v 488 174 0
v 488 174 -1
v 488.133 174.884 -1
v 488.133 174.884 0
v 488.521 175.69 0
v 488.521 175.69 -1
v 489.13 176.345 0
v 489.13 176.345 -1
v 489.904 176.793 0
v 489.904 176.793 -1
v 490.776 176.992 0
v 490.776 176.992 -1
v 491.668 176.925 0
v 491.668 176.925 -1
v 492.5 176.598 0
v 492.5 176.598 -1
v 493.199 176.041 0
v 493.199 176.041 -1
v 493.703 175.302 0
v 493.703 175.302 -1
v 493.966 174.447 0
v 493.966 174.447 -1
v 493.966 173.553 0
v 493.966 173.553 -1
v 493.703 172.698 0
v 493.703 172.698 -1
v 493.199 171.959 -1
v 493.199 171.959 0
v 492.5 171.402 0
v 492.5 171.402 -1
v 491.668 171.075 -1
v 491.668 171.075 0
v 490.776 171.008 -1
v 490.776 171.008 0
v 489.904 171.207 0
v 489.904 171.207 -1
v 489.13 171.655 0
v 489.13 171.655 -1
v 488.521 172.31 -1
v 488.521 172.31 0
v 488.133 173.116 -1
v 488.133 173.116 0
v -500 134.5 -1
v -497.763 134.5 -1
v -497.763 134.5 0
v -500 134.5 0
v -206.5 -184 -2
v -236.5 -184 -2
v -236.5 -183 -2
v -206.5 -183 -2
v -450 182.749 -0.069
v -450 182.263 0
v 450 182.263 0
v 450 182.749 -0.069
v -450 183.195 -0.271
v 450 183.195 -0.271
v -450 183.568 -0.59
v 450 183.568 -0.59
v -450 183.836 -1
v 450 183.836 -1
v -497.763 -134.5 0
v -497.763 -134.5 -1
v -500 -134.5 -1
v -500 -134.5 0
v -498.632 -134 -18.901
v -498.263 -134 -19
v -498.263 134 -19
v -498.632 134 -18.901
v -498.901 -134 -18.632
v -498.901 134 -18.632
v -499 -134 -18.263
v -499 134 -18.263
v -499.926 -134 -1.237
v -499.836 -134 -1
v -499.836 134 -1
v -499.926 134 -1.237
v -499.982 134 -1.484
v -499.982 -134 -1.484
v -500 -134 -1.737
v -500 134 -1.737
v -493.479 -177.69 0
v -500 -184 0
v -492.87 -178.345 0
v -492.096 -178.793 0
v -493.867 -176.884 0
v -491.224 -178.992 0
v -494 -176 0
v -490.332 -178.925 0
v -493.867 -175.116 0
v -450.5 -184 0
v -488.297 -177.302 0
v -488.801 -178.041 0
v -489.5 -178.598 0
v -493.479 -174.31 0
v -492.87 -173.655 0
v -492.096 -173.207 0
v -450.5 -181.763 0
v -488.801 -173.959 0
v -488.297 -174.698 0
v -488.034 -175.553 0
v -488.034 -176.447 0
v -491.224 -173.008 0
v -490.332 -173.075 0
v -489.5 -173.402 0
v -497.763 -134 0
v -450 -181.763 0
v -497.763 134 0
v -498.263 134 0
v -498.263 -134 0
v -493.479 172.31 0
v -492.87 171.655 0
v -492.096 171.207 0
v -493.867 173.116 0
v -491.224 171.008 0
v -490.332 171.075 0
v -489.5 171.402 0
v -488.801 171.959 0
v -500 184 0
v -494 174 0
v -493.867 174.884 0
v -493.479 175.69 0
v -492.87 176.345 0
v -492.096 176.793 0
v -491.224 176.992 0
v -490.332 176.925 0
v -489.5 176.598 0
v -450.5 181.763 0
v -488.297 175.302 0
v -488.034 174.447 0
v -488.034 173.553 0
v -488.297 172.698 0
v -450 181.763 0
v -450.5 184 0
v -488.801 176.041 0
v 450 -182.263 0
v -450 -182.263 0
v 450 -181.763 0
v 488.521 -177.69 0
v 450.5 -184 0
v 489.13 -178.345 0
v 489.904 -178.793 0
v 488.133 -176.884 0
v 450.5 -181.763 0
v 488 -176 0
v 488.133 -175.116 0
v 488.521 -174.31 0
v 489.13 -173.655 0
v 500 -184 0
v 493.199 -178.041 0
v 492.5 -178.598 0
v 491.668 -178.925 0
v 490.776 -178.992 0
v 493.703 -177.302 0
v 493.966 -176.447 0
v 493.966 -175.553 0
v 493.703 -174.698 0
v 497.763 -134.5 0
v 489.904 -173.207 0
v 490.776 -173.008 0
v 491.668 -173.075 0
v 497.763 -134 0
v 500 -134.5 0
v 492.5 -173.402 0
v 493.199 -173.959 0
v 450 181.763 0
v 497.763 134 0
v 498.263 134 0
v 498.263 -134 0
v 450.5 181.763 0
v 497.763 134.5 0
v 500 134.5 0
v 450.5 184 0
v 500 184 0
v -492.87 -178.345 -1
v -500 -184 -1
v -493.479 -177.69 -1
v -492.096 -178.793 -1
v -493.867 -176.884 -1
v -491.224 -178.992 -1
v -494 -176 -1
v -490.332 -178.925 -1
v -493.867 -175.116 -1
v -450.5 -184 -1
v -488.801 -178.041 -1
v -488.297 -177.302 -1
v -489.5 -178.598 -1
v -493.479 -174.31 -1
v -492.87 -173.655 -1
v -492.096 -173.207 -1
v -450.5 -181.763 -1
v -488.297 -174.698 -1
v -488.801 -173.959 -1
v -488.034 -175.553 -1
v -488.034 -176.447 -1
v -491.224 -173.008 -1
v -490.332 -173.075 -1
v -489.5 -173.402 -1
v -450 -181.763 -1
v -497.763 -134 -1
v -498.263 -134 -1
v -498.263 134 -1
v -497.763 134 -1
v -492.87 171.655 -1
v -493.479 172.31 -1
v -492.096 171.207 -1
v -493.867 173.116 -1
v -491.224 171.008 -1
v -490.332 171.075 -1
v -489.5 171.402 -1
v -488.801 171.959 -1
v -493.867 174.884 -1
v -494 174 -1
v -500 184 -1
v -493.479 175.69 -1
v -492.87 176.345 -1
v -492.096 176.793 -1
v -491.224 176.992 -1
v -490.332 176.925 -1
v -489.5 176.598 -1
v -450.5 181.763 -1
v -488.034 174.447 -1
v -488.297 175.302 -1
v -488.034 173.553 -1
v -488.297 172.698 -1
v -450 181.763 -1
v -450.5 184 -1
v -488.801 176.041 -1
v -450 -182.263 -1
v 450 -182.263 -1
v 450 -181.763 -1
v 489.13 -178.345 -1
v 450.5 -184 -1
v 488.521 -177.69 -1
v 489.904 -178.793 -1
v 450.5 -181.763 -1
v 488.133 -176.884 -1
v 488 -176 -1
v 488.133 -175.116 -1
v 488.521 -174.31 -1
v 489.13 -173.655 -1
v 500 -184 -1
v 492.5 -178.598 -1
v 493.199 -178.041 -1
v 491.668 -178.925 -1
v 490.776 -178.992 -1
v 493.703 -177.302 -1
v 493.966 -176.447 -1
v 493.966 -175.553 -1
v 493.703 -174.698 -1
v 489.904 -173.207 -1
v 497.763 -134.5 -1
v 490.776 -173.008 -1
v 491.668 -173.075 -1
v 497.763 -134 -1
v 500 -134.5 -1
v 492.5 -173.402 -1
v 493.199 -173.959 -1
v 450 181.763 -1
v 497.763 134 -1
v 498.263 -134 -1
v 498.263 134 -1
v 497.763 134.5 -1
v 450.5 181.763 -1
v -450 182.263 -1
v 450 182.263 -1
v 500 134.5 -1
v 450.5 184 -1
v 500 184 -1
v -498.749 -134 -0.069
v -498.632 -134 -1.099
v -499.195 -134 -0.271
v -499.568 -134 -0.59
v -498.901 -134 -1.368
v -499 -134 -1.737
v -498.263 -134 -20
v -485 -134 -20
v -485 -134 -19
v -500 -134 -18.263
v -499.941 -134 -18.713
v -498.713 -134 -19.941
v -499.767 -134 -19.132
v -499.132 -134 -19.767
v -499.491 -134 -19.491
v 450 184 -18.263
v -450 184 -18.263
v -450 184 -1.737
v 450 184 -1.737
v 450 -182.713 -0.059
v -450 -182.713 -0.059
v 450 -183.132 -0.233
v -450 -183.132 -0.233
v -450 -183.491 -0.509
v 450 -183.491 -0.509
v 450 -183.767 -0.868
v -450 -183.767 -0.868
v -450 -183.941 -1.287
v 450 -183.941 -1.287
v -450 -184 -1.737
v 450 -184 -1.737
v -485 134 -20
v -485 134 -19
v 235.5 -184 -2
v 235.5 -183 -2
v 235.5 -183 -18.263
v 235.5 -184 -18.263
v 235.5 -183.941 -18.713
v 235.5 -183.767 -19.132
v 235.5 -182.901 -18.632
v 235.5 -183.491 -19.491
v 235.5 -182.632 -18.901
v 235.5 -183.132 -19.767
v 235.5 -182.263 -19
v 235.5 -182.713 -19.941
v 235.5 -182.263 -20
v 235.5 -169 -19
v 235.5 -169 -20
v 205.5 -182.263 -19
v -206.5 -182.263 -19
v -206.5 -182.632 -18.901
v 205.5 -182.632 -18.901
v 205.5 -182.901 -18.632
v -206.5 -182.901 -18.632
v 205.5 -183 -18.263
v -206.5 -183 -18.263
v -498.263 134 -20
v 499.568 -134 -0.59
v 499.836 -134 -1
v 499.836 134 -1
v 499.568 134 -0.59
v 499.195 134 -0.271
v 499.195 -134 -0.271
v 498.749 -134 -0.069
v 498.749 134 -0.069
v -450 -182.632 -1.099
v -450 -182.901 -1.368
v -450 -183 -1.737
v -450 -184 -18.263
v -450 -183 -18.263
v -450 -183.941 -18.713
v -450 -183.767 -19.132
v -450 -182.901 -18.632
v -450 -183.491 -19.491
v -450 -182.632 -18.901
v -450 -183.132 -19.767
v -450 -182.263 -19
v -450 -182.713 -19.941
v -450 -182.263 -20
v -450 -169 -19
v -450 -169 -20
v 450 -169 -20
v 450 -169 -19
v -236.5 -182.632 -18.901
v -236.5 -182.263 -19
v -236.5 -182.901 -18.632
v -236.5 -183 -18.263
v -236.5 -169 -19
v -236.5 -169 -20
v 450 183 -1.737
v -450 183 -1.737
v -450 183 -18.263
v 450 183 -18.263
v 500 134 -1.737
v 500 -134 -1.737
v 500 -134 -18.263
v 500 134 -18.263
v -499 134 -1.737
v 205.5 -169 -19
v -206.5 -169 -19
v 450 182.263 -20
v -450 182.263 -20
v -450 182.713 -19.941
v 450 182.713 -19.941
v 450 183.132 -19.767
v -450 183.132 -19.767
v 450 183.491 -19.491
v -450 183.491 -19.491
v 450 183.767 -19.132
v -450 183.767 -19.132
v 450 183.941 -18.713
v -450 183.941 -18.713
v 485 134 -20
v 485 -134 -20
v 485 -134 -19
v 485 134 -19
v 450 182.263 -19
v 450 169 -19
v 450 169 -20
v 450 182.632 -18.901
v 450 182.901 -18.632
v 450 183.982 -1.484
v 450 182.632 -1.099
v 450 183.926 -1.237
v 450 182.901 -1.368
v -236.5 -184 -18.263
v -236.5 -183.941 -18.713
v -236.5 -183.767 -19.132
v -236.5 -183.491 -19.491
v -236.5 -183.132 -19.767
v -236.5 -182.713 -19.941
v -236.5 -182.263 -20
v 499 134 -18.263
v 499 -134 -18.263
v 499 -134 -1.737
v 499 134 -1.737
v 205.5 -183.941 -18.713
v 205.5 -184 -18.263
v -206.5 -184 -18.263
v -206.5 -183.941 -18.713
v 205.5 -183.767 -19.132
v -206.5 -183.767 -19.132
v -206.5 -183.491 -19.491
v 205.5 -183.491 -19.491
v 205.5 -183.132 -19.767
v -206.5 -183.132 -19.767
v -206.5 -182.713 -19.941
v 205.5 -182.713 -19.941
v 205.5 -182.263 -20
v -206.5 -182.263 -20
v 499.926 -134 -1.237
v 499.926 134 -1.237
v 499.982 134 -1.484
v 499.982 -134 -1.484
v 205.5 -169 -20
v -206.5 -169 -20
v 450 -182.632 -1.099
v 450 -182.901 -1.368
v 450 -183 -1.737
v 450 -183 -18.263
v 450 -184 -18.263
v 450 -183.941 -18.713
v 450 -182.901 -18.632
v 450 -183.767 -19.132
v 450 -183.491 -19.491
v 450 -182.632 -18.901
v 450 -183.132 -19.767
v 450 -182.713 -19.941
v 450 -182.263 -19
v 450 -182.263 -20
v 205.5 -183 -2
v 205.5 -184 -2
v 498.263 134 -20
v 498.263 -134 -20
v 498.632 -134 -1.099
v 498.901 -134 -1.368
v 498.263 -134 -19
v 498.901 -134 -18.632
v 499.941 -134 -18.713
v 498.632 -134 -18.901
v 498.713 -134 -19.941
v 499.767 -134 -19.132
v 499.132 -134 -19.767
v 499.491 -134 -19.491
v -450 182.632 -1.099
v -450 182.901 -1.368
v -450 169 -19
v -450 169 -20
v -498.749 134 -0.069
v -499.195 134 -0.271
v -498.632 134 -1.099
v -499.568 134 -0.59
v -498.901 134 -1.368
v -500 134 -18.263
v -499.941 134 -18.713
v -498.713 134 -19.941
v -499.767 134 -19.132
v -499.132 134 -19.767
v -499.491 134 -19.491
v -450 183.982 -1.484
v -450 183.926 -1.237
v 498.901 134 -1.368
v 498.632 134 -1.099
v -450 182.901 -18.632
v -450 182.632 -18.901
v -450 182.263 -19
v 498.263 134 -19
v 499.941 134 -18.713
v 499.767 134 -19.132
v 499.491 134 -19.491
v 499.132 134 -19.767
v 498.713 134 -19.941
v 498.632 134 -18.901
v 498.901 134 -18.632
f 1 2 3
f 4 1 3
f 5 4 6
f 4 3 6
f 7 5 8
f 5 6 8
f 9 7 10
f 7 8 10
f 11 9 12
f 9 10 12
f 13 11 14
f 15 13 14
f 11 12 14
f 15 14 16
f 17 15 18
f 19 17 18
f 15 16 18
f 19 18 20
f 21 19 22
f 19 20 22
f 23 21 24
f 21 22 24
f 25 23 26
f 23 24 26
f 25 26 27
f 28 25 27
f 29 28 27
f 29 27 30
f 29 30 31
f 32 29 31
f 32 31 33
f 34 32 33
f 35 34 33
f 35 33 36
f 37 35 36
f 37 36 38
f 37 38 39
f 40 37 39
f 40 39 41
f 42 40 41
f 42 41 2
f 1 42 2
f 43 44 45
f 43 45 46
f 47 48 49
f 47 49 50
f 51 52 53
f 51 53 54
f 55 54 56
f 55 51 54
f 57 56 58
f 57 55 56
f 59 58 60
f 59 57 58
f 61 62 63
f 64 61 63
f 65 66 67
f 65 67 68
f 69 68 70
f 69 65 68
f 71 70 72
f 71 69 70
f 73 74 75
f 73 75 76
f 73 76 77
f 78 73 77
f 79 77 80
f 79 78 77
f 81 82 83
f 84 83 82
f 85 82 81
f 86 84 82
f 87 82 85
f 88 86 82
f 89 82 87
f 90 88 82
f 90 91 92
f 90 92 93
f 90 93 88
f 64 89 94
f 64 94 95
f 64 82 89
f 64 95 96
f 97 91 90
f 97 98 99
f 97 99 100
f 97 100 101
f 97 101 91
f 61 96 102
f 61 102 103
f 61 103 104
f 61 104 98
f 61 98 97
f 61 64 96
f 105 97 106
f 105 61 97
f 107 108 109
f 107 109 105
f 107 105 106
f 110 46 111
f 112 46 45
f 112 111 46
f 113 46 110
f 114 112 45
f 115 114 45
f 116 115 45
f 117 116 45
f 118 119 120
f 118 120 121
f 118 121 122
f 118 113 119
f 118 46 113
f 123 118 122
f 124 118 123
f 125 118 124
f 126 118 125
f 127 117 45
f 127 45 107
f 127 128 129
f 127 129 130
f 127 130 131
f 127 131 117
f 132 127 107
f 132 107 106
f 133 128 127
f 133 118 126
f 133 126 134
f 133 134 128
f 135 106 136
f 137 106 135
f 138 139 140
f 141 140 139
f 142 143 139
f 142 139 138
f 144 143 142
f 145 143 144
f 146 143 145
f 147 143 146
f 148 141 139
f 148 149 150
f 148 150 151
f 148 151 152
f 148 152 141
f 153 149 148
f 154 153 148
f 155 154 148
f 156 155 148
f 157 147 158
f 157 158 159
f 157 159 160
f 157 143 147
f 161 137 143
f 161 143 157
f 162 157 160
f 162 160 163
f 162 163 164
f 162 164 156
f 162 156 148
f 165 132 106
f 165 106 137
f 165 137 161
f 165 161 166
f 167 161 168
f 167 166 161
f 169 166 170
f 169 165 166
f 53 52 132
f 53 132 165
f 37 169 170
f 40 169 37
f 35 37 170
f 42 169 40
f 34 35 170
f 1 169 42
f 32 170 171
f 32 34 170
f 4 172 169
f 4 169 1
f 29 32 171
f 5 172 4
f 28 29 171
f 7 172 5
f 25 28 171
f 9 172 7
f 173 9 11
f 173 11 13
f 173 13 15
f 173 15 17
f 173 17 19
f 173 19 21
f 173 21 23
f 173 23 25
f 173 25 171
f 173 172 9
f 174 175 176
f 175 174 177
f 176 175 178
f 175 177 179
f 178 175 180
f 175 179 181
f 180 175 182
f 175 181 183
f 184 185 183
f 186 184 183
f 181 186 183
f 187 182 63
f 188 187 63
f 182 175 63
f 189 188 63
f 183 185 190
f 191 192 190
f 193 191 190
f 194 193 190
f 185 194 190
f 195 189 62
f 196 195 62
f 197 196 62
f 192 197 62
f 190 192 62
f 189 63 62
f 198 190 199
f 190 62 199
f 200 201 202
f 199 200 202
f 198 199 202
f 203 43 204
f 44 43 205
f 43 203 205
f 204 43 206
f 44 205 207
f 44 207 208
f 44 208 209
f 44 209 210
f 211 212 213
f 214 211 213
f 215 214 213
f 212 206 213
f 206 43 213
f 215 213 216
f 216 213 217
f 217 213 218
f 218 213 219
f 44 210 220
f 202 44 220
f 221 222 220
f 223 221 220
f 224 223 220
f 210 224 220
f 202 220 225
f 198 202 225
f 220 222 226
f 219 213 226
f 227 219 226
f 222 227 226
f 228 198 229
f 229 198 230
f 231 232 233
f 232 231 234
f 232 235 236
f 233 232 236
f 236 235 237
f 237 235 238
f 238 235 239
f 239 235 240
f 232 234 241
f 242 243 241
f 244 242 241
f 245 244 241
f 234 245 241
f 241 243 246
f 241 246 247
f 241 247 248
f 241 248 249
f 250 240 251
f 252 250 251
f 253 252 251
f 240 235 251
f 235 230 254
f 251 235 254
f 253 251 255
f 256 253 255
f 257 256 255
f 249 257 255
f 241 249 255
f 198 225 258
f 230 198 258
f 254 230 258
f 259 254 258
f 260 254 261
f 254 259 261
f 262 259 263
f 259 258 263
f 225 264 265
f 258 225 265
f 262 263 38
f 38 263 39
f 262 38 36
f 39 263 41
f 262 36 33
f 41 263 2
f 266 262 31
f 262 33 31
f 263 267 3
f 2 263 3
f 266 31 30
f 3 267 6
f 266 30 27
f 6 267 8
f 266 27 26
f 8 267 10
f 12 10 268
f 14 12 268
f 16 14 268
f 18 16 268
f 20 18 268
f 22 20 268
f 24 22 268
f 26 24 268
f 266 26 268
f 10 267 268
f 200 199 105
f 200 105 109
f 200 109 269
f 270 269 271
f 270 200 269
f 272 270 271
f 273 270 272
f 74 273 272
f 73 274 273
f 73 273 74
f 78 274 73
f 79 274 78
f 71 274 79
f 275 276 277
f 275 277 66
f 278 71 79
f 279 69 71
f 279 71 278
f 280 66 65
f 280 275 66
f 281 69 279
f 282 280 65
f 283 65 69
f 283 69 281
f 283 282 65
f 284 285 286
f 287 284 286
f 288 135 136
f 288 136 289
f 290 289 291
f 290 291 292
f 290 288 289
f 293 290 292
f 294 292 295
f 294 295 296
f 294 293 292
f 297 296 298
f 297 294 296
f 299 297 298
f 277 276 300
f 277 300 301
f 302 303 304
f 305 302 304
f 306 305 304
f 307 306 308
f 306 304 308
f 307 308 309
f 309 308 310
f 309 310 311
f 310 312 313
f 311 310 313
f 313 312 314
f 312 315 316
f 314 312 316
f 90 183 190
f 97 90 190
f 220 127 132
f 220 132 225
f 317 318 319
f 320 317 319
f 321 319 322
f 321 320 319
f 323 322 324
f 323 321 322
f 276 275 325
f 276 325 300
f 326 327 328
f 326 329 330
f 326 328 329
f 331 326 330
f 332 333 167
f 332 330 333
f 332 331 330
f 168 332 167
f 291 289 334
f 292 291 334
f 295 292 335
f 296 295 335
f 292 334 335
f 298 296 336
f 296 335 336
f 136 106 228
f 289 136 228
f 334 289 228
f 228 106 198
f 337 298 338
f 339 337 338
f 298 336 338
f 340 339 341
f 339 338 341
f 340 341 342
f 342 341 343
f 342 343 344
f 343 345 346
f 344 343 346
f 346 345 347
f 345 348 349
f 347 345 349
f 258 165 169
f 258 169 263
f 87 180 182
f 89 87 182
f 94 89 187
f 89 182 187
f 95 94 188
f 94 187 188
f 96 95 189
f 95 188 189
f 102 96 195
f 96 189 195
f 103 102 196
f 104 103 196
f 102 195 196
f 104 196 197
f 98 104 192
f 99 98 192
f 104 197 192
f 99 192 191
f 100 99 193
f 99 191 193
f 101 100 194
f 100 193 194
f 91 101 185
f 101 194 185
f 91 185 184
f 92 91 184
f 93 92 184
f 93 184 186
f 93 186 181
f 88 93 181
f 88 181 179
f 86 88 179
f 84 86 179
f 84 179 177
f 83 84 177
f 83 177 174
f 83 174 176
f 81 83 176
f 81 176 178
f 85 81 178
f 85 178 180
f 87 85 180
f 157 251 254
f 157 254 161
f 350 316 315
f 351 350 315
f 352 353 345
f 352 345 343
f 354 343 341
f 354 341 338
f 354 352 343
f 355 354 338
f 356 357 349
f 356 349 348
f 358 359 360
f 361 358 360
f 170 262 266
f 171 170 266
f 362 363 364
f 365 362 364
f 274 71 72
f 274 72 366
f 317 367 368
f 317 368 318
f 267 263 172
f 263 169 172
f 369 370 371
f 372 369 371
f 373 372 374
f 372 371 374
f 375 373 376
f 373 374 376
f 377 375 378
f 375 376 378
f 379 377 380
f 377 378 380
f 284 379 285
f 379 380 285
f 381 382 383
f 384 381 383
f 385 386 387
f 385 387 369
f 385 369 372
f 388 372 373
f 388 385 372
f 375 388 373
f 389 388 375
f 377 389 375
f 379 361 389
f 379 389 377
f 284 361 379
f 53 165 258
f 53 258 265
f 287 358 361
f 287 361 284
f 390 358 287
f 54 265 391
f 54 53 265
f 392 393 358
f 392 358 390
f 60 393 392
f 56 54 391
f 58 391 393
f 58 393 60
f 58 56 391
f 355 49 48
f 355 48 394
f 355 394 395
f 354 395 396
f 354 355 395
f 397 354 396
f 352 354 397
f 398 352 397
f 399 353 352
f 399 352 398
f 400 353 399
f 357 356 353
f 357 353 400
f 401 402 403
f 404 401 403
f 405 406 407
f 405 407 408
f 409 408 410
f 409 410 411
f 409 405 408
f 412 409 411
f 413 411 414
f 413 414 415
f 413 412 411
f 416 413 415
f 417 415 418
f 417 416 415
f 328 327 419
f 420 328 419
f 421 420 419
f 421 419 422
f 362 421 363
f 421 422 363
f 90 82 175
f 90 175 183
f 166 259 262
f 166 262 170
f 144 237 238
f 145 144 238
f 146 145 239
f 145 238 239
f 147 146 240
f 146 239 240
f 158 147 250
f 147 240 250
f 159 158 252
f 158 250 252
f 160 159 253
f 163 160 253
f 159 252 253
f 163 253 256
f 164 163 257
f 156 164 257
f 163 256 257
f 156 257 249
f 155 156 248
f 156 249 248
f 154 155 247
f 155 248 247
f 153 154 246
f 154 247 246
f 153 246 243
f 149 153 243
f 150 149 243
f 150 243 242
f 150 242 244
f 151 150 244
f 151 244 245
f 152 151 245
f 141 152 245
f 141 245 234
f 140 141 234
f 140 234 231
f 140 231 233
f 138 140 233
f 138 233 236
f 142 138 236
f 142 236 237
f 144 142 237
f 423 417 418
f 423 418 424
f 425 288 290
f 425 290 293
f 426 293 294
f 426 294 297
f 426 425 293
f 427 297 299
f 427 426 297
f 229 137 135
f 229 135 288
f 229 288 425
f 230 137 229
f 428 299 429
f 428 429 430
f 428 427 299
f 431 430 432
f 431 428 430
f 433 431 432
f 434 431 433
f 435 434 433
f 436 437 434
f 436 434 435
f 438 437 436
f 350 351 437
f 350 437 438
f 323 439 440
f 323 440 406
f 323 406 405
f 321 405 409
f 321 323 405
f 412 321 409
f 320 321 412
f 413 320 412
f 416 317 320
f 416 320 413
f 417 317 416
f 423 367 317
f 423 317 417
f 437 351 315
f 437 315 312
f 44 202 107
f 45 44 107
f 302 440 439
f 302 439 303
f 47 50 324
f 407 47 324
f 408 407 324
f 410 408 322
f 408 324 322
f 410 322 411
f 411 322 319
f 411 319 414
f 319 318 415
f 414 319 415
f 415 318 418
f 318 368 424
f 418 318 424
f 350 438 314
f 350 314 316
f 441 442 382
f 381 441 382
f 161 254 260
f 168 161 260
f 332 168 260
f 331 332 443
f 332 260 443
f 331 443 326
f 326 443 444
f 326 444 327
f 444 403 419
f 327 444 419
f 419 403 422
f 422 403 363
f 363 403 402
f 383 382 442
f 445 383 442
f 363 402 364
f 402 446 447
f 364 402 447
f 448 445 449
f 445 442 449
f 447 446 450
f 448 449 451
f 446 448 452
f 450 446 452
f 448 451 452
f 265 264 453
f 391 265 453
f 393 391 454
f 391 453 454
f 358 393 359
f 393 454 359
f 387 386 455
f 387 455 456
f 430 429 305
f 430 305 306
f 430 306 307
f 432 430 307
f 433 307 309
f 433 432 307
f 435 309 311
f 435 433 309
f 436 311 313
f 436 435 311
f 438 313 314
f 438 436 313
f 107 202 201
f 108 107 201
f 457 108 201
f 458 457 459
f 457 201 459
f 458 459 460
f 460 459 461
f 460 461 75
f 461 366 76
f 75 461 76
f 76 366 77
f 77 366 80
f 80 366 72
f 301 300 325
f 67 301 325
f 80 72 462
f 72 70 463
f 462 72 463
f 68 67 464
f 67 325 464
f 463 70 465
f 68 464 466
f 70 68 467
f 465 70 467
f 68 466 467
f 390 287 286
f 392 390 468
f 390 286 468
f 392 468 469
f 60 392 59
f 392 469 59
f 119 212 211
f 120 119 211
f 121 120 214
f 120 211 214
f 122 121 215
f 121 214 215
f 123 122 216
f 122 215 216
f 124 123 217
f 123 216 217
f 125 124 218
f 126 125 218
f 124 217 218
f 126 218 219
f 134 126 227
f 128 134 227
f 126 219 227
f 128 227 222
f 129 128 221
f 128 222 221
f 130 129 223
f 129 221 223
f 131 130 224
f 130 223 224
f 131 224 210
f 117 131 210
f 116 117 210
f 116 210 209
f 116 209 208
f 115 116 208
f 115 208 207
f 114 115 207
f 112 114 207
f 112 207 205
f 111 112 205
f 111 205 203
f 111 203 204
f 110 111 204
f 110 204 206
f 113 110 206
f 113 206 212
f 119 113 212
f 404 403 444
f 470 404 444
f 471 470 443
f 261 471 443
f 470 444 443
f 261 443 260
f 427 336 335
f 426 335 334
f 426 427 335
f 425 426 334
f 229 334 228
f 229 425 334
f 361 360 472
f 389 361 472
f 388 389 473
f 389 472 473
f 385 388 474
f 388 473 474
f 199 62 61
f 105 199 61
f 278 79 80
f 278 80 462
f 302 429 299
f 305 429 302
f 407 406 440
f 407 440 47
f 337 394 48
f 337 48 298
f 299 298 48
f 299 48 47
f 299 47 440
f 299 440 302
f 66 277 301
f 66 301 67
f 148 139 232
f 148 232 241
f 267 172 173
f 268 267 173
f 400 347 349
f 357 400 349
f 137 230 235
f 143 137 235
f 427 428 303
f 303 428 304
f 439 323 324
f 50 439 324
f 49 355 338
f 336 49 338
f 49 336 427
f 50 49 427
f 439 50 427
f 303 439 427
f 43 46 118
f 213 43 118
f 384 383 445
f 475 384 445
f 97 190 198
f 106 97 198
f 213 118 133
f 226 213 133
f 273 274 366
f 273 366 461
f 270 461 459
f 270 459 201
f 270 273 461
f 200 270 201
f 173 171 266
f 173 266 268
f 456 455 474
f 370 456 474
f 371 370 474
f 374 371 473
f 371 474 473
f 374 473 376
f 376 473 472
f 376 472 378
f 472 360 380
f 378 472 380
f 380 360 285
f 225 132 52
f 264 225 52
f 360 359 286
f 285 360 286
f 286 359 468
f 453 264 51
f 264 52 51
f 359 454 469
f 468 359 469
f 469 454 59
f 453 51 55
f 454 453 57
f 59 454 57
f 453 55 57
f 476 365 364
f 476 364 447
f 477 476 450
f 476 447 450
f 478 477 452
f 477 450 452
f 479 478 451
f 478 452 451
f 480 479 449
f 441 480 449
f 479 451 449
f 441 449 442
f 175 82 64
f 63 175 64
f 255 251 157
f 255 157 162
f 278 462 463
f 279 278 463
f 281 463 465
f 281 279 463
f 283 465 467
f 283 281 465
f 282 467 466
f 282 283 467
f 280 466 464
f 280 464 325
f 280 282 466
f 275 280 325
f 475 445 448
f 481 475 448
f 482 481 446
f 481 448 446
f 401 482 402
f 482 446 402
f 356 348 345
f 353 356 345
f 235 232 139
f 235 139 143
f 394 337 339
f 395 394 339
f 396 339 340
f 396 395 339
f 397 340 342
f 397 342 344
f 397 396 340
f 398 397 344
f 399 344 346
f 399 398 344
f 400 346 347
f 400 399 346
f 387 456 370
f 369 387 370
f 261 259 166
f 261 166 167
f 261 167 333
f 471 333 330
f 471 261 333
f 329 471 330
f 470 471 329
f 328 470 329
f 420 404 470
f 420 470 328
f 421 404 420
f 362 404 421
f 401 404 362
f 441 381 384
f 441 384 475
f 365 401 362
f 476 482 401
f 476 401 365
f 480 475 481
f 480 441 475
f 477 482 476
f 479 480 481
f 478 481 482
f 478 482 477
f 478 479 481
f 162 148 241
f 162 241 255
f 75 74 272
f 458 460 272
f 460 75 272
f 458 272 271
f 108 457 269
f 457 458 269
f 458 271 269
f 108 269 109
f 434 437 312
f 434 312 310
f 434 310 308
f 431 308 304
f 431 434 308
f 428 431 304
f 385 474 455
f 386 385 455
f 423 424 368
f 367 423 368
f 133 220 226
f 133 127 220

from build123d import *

# Parameters (mm, degrees)
SKETCH_1_W                         = 1000
SKETCH_1_H                         = 368
SM_BASE_FLANGE_1_DEPTH             = 1
OTHER_START                        = -134.5
OTHER_1_DEPTH                      = 269
OTHER_1_2_DEPTH                    = 0.5
OTHER_START_2                      = 134
OTHER_1_3_DEPTH                    = 0.5
OTHER_START_3                      = -134
OTHER_1_4_DEPTH                    = 268
OTHER_START_4                      = -450.5
OTHER_2_DEPTH                      = 901
OTHER_2_2_DEPTH                    = 0.5
OTHER_START_5                      = 450
OTHER_2_3_DEPTH                    = 0.5
OTHER_START_6                      = -450
OTHER_2_4_DEPTH                    = 900
SM_EDGE_FLANGE_1_STRIP_W           = 5.4732
SM_EDGE_FLANGE_1_STRIP_H           = 1
SM_EDGE_FLANGE_1_STRIP_CUT_DEPTH   = 900
SM_EDGE_FLANGE_1_RELIEF_W          = 5.9732
SM_EDGE_FLANGE_1_RELIEF_H          = 0.5
SM_EDGE_FLANGE_1_RELIEF_CUT_DEPTH  = 1
SM_EDGE_FLANGE_1_DEPTH             = 900
SM_EDGE_FLANGE_1_FLAT_DEPTH        = 1
SM_EDGE_FLANGE_2_STRIP_W           = 5.4732
SM_EDGE_FLANGE_2_STRIP_H           = 1
SM_EDGE_FLANGE_2_STRIP_CUT_DEPTH   = 214.5
SM_EDGE_FLANGE_2_STRIP_2_W         = 5.4732
SM_EDGE_FLANGE_2_STRIP_2_H         = 1
SM_EDGE_FLANGE_2_STRIP_CUT_2_DEPTH = 412
SM_EDGE_FLANGE_2_STRIP_3_W         = 5.4732
SM_EDGE_FLANGE_2_STRIP_3_H         = 1
SM_EDGE_FLANGE_2_STRIP_CUT_3_DEPTH = 213.5
SM_EDGE_FLANGE_2_DEPTH             = 214.5
SM_EDGE_FLANGE_2_BEND_DEPTH        = 412
SM_EDGE_FLANGE_2_BEND_2_DEPTH      = 213.5
SKETCH_19_R                        = 3
CUT_EXTRUDE_1_DEPTH                = 534.120061525


# Read off the part's stored shape, not the designer's step: 斜接法兰1, 斜接法兰2
# Sheet-metal steps are written as plain solids
with BuildPart() as part:
    # Sketch 1 → 基体-法兰1 (new body)
    with BuildSketch(Plane.XY):
        Rectangle(SKETCH_1_W, SKETCH_1_H)
    extrude(amount=-SM_BASE_FLANGE_1_DEPTH)

    # Other 1 outline → Other 1 (cut)
    with BuildSketch(Plane(origin=(0, 0, 0), x_dir=(1, 0, 0), z_dir=(0, 1, 0)).offset(OTHER_START)):
        with BuildLine():
            Line((500, 1), (499.83604109, 1))
            ThreePointArc((499.83604109, 1), (499.195226164, 0.271171885), (498.2634, 0))
            Line((498.2634, 0), (500, 0))
            Line((500, 0), (500, 1))
        make_face()
    other_1 = extrude(amount=OTHER_1_DEPTH, mode=Mode.SUBTRACT)

    # Other 1 2 outline → Other 1 2 (cut)
    with BuildSketch(Plane(origin=(0, 0, 0), x_dir=(1, 0, 0), z_dir=(0, 1, 0)).offset(OTHER_START)):
        with BuildLine():
            ThreePointArc((498.2634, 0), (499.195226164, 0.271171885), (499.83604109, 1))
            Line((499.83604109, 1), (497.7634, 1))
            Line((497.7634, 1), (497.7634, 0))
            Line((497.7634, 0), (498.2634, 0))
        make_face()
    other_1_2 = extrude(amount=OTHER_1_2_DEPTH, mode=Mode.SUBTRACT)

    # Other 1 3 outline → Other 1 3 (cut)
    with BuildSketch(Plane(origin=(0, 0, 0), x_dir=(1, 0, 0), z_dir=(0, 1, 0)).offset(OTHER_START_2)):
        with BuildLine():
            ThreePointArc((498.2634, 0), (499.195226164, 0.271171885), (499.83604109, 1))
            Line((499.83604109, 1), (497.7634, 1))
            Line((497.7634, 1), (497.7634, 0))
            Line((497.7634, 0), (498.2634, 0))
        make_face()
    other_1_3 = extrude(amount=OTHER_1_3_DEPTH, mode=Mode.SUBTRACT)

    # Other 1 4 outline → Other 1 4 (add)
    with BuildSketch(Plane(origin=(0, 0, 0), x_dir=(1, 0, 0), z_dir=(0, 1, 0)).offset(OTHER_START_3)):
        with BuildLine():
            Line((500, 1.7366), (500, 18.2634))
            ThreePointArc((500, 18.2634), (499.491361636, 19.491361636), (498.2634, 20))
            Line((498.2634, 20), (485, 20))
            Line((485, 20), (485, 19))
            Line((485, 19), (498.2634, 19))
            ThreePointArc((498.2634, 19), (498.784254855, 18.784254855), (499, 18.2634))
            Line((499, 18.2634), (499, 1.7366))
            ThreePointArc((499, 1.7366), (498.784254855, 1.215745145), (498.2634, 1))
            Line((498.2634, 1), (499.83604109, 1))
            ThreePointArc((499.83604109, 1), (499.958514757, 1.359286442), (500, 1.7366))
        make_face()
    other_1_4 = extrude(amount=OTHER_1_4_DEPTH)

    # Other 2 outline → Other 2 (cut)
    with BuildSketch(Plane.YZ.offset(OTHER_START_4)):
        with BuildLine():
            ThreePointArc((182.2634, 0), (183.195226164, -0.271171885), (183.83604109, -1))
            Line((183.83604109, -1), (184, -1))
            Line((184, -1), (184, 0))
            Line((184, 0), (182.2634, 0))
        make_face()
    extrude(amount=OTHER_2_DEPTH, mode=Mode.SUBTRACT)

    # Other 2 2 outline → Other 2 2 (cut)
    with BuildSketch(Plane.YZ.offset(OTHER_START_4)):
        with BuildLine():
            Line((181.7634, -1), (183.83604109, -1))
            ThreePointArc((183.83604109, -1), (183.195226164, -0.271171885), (182.2634, 0))
            Line((182.2634, 0), (181.7634, 0))
            Line((181.7634, 0), (181.7634, -1))
        make_face()
    extrude(amount=OTHER_2_2_DEPTH, mode=Mode.SUBTRACT)

    # Other 2 3 outline → Other 2 3 (cut)
    with BuildSketch(Plane.YZ.offset(OTHER_START_5)):
        with BuildLine():
            Line((181.7634, -1), (183.83604109, -1))
            ThreePointArc((183.83604109, -1), (183.195226164, -0.271171885), (182.2634, 0))
            Line((182.2634, 0), (181.7634, 0))
            Line((181.7634, 0), (181.7634, -1))
        make_face()
    extrude(amount=OTHER_2_3_DEPTH, mode=Mode.SUBTRACT)

    # Other 2 4 outline → Other 2 4 (add)
    with BuildSketch(Plane.YZ.offset(OTHER_START_6)):
        with BuildLine():
            Line((184, -18.2634), (184, -1.7366))
            ThreePointArc((184, -1.7366), (183.958514757, -1.359286442), (183.83604109, -1))
            Line((183.83604109, -1), (182.2634, -1))
            ThreePointArc((182.2634, -1), (182.784254855, -1.215745145), (183, -1.7366))
            Line((183, -1.7366), (183, -18.2634))
            ThreePointArc((183, -18.2634), (182.784254855, -18.784254855), (182.2634, -19))
            Line((182.2634, -19), (169, -19))
            Line((169, -19), (169, -20))
            Line((169, -20), (182.2634, -20))
            ThreePointArc((182.2634, -20), (183.491361636, -19.491361636), (184, -18.2634))
        make_face()
    extrude(amount=OTHER_2_4_DEPTH)

    # 镜向1: Other 1, Other 1 2, Other 1 3, Other 1 4 across plane
    add(other_1.mirror(Plane(origin=(0, 0, 0), x_dir=(0, 0, 1), z_dir=(1, 0, 0))), mode=Mode.SUBTRACT)
    add(other_1_2.mirror(Plane(origin=(0, 0, 0), x_dir=(0, 0, 1), z_dir=(1, 0, 0))), mode=Mode.SUBTRACT)
    add(other_1_3.mirror(Plane(origin=(0, 0, 0), x_dir=(0, 0, 1), z_dir=(1, 0, 0))), mode=Mode.SUBTRACT)
    add(other_1_4.mirror(Plane(origin=(0, 0, 0), x_dir=(0, 0, 1), z_dir=(1, 0, 0))))

    # 边线-法兰1 strip (across the edge) → 边线-法兰1 strip cut (cut)
    with BuildSketch(Plane(origin=(450, -184, -1), x_dir=(0, 1, 0), z_dir=(-1, 0, 0))):
        with Locations((-1, -0.5)):
            Rectangle(SM_EDGE_FLANGE_1_STRIP_W, SM_EDGE_FLANGE_1_STRIP_H)
    extrude(amount=SM_EDGE_FLANGE_1_STRIP_CUT_DEPTH, mode=Mode.SUBTRACT)

    # 边线-法兰1 relief (on the sheet) → 边线-法兰1 relief cut (cut)
    with BuildSketch(Plane(origin=(450, -182.2634, -1), x_dir=(0, 1, 0), z_dir=(0, 0, -1))):
        with Locations((-2.4866, 0.25)):
            Rectangle(SM_EDGE_FLANGE_1_RELIEF_W, SM_EDGE_FLANGE_1_RELIEF_H)
        with Locations((-2.4866, -900.25)):
            Rectangle(SM_EDGE_FLANGE_1_RELIEF_W, SM_EDGE_FLANGE_1_RELIEF_H)
    extrude(amount=-SM_EDGE_FLANGE_1_RELIEF_CUT_DEPTH, mode=Mode.SUBTRACT)

    # 边线-法兰1 bend section (across the edge) → 边线-法兰1 (add)
    with BuildSketch(Plane(origin=(450, -184, -1), x_dir=(0, 1, 0), z_dir=(-1, 0, 0))):
        with BuildLine():
            Line((0, 0.7366), (1, 0.7366))
            ThreePointArc((1, 0.7366), (1.215745145, 0.215745145), (1.7366, 0))
            Line((1.7366, 0), (1.7366, -1))
            ThreePointArc((1.7366, -1), (0.508638364, -0.491361636), (0, 0.7366))
        make_face()
    extrude(amount=SM_EDGE_FLANGE_1_DEPTH)

    # 边线-法兰1 profile (on flange) → 边线-法兰1 flat (add)
    with BuildSketch(Plane(origin=(0, -184, -1), x_dir=(-1, 0, 0), z_dir=(0, -1, 0))):
        Polygon((-450, 0.7366), (450, 0.7366), (450, 19), (236.5, 19), (236.5, 1), (206.5, 1), (206.5, 19), (-205.5, 19), (-205.5, 1), (-235.5, 1), (-235.5, 19), (-450, 19), align=None)
    extrude(amount=-SM_EDGE_FLANGE_1_FLAT_DEPTH)

    # 边线-法兰2 strip (across the edge) → 边线-法兰2 strip cut (cut)
    with BuildSketch(Plane(origin=(450, -183, -20), x_dir=(0, 0, 1), z_dir=(-1, 0, 0))):
        with Locations((-1, -0.5)):
            Rectangle(SM_EDGE_FLANGE_2_STRIP_W, SM_EDGE_FLANGE_2_STRIP_H)
    extrude(amount=SM_EDGE_FLANGE_2_STRIP_CUT_DEPTH, mode=Mode.SUBTRACT)

    # 边线-法兰2 strip 2 (across the edge) → 边线-法兰2 strip cut 2 (cut)
    with BuildSketch(Plane(origin=(205.5, -183, -20), x_dir=(0, 0, 1), z_dir=(-1, 0, 0))):
        with Locations((-1, -0.5)):
            Rectangle(SM_EDGE_FLANGE_2_STRIP_2_W, SM_EDGE_FLANGE_2_STRIP_2_H)
    extrude(amount=SM_EDGE_FLANGE_2_STRIP_CUT_2_DEPTH, mode=Mode.SUBTRACT)

    # 边线-法兰2 strip 3 (across the edge) → 边线-法兰2 strip cut 3 (cut)
    with BuildSketch(Plane(origin=(-236.5, -183, -20), x_dir=(0, 0, 1), z_dir=(-1, 0, 0))):
        with Locations((-1, -0.5)):
            Rectangle(SM_EDGE_FLANGE_2_STRIP_3_W, SM_EDGE_FLANGE_2_STRIP_3_H)
    extrude(amount=SM_EDGE_FLANGE_2_STRIP_CUT_3_DEPTH, mode=Mode.SUBTRACT)

    # 边线-法兰2 section (across the edge) → 边线-法兰2 (add)
    with BuildSketch(Plane(origin=(450, -183, -20), x_dir=(0, 0, 1), z_dir=(-1, 0, 0))):
        with BuildLine():
            Line((0, 0.7366), (0, 14))
            Line((0, 14), (1, 14))
            Line((1, 14), (1, 0.7366))
            ThreePointArc((1, 0.7366), (1.215745145, 0.215745145), (1.7366, 0))
            Line((1.7366, 0), (1.7366, -1))
            ThreePointArc((1.7366, -1), (0.508638364, -0.491361636), (0, 0.7366))
        make_face()
    extrude(amount=SM_EDGE_FLANGE_2_DEPTH)

    # 边线-法兰2 section 2 (across the edge) → 边线-法兰2 bend (add)
    with BuildSketch(Plane(origin=(205.5, -183, -20), x_dir=(0, 0, 1), z_dir=(-1, 0, 0))):
        with BuildLine():
            Line((0, 0.7366), (0, 14))
            Line((0, 14), (1, 14))
            Line((1, 14), (1, 0.7366))
            ThreePointArc((1, 0.7366), (1.215745145, 0.215745145), (1.7366, 0))
            Line((1.7366, 0), (1.7366, -1))
            ThreePointArc((1.7366, -1), (0.508638364, -0.491361636), (0, 0.7366))
        make_face()
    extrude(amount=SM_EDGE_FLANGE_2_BEND_DEPTH)

    # 边线-法兰2 section 3 (across the edge) → 边线-法兰2 bend 2 (add)
    with BuildSketch(Plane(origin=(-236.5, -183, -20), x_dir=(0, 0, 1), z_dir=(-1, 0, 0))):
        with BuildLine():
            Line((0, 0.7366), (0, 14))
            Line((0, 14), (1, 14))
            Line((1, 14), (1, 0.7366))
            ThreePointArc((1, 0.7366), (1.215745145, 0.215745145), (1.7366, 0))
            Line((1.7366, 0), (1.7366, -1))
            ThreePointArc((1.7366, -1), (0.508638364, -0.491361636), (0, 0.7366))
        make_face()
    extrude(amount=SM_EDGE_FLANGE_2_BEND_2_DEPTH)

    # 草图19 → 切除-拉伸1 (cut, through all)
    with BuildSketch(Plane(origin=(0, 0, -1), x_dir=(-1, 0, 0), z_dir=(0, 0, -1))):
        with Locations((-491, 174)):
            Circle(SKETCH_19_R)
        with Locations((-491, -176)):
            Circle(SKETCH_19_R)
        with Locations((491, -176)):
            Circle(SKETCH_19_R)
        with Locations((491, 174)):
            Circle(SKETCH_19_R)
    extrude(amount=-CUT_EXTRUDE_1_DEPTH, mode=Mode.SUBTRACT)


solid = part.part
